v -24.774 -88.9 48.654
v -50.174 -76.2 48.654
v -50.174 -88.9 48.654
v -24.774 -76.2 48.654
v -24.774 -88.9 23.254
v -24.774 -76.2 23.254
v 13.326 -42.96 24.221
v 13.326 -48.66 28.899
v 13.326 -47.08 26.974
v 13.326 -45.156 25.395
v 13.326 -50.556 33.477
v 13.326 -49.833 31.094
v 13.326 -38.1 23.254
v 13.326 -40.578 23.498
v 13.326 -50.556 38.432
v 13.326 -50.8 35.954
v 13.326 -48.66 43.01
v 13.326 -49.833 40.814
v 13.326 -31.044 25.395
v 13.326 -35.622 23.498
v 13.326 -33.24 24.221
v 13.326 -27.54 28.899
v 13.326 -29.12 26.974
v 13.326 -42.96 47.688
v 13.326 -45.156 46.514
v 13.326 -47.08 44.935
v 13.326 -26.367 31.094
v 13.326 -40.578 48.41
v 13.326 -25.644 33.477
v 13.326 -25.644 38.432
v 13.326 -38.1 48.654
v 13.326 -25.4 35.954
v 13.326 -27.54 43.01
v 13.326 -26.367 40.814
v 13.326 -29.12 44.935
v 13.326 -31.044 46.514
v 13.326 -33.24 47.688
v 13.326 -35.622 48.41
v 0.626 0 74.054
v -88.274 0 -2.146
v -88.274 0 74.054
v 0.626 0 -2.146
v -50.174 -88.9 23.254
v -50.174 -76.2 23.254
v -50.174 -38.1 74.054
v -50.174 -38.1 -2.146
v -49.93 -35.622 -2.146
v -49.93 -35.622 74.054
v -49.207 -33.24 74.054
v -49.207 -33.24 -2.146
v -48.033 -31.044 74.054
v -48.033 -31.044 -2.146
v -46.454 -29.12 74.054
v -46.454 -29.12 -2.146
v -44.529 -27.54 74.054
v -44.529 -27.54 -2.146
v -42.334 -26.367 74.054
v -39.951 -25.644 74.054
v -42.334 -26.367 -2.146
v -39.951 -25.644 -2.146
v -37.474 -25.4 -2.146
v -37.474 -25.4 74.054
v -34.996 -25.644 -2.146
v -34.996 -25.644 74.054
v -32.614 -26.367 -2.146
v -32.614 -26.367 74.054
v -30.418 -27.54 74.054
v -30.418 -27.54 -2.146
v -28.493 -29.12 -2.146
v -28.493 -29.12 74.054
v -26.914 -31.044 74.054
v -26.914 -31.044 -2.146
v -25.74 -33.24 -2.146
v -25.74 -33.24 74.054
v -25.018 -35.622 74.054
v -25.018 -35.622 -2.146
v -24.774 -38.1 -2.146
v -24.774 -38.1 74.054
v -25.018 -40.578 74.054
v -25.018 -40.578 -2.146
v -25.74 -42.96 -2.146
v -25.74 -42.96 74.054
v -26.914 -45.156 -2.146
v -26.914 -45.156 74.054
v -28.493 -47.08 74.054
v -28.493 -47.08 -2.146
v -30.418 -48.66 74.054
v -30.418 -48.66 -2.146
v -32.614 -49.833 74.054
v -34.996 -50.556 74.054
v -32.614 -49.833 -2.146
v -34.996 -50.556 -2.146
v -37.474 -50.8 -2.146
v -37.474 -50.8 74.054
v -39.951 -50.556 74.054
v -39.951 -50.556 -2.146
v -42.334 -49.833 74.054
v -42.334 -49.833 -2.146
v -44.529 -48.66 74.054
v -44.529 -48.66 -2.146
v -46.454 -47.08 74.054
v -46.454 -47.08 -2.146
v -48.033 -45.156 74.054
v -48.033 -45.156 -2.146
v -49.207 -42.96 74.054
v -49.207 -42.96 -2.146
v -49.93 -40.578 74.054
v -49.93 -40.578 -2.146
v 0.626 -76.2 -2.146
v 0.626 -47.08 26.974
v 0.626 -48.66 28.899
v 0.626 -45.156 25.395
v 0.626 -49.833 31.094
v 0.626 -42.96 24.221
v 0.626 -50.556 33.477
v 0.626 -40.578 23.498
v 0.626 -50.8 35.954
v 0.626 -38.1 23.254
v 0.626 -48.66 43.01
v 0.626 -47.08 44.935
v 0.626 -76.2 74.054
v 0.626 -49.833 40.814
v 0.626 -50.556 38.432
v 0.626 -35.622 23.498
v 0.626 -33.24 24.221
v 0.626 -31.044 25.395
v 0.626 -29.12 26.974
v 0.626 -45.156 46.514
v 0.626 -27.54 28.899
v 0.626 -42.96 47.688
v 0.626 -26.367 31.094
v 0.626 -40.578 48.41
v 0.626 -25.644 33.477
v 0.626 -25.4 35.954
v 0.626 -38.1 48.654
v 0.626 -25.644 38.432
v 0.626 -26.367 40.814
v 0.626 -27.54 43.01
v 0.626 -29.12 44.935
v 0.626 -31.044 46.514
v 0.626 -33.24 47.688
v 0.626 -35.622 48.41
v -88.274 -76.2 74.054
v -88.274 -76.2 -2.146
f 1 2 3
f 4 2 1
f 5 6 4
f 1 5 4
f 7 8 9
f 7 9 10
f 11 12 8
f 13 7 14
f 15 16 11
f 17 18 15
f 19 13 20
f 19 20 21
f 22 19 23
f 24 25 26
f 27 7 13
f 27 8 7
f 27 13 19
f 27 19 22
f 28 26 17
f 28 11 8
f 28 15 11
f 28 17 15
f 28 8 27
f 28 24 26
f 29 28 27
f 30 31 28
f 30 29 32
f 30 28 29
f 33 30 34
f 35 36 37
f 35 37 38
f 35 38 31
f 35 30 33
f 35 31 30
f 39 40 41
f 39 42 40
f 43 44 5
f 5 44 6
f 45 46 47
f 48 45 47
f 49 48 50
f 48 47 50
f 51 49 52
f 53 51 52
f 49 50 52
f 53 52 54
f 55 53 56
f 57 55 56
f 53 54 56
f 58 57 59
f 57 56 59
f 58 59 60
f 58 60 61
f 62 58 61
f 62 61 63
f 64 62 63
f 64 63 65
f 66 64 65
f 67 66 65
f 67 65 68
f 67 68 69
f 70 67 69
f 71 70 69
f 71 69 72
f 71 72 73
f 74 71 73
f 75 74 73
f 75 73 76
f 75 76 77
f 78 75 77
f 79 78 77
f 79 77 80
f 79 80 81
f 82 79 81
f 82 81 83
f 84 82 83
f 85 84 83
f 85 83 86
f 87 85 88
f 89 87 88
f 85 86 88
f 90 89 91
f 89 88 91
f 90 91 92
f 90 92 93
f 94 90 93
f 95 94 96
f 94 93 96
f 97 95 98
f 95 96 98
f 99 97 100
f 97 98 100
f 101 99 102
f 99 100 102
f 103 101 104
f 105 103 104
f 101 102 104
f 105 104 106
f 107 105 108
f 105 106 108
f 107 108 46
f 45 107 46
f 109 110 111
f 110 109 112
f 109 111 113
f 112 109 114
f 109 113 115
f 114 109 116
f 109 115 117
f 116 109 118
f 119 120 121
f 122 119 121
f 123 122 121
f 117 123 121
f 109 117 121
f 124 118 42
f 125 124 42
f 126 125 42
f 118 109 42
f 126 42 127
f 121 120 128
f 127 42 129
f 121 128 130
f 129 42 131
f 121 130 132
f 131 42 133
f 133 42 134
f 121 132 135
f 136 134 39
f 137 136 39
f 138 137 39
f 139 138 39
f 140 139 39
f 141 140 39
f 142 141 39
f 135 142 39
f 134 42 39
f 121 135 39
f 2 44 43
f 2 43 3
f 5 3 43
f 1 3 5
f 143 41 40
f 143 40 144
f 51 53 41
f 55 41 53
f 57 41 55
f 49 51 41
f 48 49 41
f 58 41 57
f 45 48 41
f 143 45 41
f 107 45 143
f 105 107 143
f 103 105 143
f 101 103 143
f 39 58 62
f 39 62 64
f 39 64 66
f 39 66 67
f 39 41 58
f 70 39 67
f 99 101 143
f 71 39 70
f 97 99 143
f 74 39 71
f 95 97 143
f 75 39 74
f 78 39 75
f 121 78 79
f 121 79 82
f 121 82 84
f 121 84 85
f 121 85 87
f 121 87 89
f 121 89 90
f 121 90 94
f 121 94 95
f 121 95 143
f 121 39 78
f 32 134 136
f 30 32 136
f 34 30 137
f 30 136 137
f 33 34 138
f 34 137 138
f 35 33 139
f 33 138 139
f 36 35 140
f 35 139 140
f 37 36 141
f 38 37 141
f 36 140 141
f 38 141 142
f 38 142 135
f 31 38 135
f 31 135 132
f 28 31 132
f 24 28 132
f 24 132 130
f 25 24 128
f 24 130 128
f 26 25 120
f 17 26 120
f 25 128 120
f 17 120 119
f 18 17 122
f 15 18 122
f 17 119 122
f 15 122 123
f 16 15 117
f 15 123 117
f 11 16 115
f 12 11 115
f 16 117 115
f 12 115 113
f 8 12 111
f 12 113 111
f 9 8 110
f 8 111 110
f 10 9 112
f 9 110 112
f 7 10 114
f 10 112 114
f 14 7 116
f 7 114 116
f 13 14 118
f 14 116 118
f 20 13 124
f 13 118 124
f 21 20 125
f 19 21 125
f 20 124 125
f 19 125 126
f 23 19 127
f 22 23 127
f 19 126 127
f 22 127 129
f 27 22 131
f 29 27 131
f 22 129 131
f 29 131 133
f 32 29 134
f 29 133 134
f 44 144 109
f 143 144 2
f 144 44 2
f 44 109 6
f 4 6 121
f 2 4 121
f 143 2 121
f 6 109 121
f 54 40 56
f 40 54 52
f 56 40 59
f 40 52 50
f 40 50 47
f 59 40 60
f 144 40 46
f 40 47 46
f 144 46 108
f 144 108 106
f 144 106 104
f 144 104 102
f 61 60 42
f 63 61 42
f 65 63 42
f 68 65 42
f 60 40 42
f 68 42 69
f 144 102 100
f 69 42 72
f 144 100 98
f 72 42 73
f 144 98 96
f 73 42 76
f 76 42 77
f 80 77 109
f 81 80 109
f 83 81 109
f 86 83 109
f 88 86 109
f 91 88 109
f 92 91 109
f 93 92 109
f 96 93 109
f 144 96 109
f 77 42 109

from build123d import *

# Parameters (mm, degrees)
F0_W     = 76.2
F0_H     = 76.2
F1_DEPTH = 76.2
F2_R     = 12.7
F3_DEPTH = 12.7
F5_D     = 25.4
F6_W     = 25.4
F6_H     = 25.4
F7_DEPTH = 12.7
F8_W     = 76.2
F8_H     = 76.2
F9_DEPTH = 12.7


with BuildPart() as f1:
    # F0 (on Front) → F1 (new body)
    with BuildSketch(Plane.XZ):
        with Locations((-37.473612465, 35.9543495976)):
            Rectangle(F0_W, F0_H)
    extrude(amount=F1_DEPTH)

    # F2 (on face) → F3 (join)
    with BuildSketch(Plane.YZ.offset(0.626387535)):
        with Locations((-38.1, 35.9543495976)):
            Circle(F2_R)
    extrude(amount=F3_DEPTH)

    # F5 (through all)
    with Locations(Plane.XY.offset(74.0543495976)):
        with Locations((-37.473612465, -38.1)):
            Hole(F5_D / 2)

    # F6 (on face) → F7 (join)
    with BuildSketch(Plane.XZ.offset(76.2)):
        with Locations((-37.473612465, 35.9543495976)):
            Rectangle(F6_W, F6_H)
    extrude(amount=F7_DEPTH)

    # F8 (on face) → F9 (join)
    with BuildSketch(Plane(origin=(-75.573612465, 0, 0), x_dir=(0, -1, 0), z_dir=(-1, 0, 0))):
        with Locations((38.1, 35.9543495976)):
            Rectangle(F8_W, F8_H)
        Polygon((23.0061305957, 44.0499627439), (48.0005134924, 48.5711156515), (39.4187553165, 24.6647686573), align=None, mode=Mode.SUBTRACT)
        Polygon((39.4187553165, 24.6647686573), (48.0005134924, 48.5711156515), (23.0061305957, 44.0499627439), align=None)
    extrude(amount=F9_DEPTH)


solid = f1.part
